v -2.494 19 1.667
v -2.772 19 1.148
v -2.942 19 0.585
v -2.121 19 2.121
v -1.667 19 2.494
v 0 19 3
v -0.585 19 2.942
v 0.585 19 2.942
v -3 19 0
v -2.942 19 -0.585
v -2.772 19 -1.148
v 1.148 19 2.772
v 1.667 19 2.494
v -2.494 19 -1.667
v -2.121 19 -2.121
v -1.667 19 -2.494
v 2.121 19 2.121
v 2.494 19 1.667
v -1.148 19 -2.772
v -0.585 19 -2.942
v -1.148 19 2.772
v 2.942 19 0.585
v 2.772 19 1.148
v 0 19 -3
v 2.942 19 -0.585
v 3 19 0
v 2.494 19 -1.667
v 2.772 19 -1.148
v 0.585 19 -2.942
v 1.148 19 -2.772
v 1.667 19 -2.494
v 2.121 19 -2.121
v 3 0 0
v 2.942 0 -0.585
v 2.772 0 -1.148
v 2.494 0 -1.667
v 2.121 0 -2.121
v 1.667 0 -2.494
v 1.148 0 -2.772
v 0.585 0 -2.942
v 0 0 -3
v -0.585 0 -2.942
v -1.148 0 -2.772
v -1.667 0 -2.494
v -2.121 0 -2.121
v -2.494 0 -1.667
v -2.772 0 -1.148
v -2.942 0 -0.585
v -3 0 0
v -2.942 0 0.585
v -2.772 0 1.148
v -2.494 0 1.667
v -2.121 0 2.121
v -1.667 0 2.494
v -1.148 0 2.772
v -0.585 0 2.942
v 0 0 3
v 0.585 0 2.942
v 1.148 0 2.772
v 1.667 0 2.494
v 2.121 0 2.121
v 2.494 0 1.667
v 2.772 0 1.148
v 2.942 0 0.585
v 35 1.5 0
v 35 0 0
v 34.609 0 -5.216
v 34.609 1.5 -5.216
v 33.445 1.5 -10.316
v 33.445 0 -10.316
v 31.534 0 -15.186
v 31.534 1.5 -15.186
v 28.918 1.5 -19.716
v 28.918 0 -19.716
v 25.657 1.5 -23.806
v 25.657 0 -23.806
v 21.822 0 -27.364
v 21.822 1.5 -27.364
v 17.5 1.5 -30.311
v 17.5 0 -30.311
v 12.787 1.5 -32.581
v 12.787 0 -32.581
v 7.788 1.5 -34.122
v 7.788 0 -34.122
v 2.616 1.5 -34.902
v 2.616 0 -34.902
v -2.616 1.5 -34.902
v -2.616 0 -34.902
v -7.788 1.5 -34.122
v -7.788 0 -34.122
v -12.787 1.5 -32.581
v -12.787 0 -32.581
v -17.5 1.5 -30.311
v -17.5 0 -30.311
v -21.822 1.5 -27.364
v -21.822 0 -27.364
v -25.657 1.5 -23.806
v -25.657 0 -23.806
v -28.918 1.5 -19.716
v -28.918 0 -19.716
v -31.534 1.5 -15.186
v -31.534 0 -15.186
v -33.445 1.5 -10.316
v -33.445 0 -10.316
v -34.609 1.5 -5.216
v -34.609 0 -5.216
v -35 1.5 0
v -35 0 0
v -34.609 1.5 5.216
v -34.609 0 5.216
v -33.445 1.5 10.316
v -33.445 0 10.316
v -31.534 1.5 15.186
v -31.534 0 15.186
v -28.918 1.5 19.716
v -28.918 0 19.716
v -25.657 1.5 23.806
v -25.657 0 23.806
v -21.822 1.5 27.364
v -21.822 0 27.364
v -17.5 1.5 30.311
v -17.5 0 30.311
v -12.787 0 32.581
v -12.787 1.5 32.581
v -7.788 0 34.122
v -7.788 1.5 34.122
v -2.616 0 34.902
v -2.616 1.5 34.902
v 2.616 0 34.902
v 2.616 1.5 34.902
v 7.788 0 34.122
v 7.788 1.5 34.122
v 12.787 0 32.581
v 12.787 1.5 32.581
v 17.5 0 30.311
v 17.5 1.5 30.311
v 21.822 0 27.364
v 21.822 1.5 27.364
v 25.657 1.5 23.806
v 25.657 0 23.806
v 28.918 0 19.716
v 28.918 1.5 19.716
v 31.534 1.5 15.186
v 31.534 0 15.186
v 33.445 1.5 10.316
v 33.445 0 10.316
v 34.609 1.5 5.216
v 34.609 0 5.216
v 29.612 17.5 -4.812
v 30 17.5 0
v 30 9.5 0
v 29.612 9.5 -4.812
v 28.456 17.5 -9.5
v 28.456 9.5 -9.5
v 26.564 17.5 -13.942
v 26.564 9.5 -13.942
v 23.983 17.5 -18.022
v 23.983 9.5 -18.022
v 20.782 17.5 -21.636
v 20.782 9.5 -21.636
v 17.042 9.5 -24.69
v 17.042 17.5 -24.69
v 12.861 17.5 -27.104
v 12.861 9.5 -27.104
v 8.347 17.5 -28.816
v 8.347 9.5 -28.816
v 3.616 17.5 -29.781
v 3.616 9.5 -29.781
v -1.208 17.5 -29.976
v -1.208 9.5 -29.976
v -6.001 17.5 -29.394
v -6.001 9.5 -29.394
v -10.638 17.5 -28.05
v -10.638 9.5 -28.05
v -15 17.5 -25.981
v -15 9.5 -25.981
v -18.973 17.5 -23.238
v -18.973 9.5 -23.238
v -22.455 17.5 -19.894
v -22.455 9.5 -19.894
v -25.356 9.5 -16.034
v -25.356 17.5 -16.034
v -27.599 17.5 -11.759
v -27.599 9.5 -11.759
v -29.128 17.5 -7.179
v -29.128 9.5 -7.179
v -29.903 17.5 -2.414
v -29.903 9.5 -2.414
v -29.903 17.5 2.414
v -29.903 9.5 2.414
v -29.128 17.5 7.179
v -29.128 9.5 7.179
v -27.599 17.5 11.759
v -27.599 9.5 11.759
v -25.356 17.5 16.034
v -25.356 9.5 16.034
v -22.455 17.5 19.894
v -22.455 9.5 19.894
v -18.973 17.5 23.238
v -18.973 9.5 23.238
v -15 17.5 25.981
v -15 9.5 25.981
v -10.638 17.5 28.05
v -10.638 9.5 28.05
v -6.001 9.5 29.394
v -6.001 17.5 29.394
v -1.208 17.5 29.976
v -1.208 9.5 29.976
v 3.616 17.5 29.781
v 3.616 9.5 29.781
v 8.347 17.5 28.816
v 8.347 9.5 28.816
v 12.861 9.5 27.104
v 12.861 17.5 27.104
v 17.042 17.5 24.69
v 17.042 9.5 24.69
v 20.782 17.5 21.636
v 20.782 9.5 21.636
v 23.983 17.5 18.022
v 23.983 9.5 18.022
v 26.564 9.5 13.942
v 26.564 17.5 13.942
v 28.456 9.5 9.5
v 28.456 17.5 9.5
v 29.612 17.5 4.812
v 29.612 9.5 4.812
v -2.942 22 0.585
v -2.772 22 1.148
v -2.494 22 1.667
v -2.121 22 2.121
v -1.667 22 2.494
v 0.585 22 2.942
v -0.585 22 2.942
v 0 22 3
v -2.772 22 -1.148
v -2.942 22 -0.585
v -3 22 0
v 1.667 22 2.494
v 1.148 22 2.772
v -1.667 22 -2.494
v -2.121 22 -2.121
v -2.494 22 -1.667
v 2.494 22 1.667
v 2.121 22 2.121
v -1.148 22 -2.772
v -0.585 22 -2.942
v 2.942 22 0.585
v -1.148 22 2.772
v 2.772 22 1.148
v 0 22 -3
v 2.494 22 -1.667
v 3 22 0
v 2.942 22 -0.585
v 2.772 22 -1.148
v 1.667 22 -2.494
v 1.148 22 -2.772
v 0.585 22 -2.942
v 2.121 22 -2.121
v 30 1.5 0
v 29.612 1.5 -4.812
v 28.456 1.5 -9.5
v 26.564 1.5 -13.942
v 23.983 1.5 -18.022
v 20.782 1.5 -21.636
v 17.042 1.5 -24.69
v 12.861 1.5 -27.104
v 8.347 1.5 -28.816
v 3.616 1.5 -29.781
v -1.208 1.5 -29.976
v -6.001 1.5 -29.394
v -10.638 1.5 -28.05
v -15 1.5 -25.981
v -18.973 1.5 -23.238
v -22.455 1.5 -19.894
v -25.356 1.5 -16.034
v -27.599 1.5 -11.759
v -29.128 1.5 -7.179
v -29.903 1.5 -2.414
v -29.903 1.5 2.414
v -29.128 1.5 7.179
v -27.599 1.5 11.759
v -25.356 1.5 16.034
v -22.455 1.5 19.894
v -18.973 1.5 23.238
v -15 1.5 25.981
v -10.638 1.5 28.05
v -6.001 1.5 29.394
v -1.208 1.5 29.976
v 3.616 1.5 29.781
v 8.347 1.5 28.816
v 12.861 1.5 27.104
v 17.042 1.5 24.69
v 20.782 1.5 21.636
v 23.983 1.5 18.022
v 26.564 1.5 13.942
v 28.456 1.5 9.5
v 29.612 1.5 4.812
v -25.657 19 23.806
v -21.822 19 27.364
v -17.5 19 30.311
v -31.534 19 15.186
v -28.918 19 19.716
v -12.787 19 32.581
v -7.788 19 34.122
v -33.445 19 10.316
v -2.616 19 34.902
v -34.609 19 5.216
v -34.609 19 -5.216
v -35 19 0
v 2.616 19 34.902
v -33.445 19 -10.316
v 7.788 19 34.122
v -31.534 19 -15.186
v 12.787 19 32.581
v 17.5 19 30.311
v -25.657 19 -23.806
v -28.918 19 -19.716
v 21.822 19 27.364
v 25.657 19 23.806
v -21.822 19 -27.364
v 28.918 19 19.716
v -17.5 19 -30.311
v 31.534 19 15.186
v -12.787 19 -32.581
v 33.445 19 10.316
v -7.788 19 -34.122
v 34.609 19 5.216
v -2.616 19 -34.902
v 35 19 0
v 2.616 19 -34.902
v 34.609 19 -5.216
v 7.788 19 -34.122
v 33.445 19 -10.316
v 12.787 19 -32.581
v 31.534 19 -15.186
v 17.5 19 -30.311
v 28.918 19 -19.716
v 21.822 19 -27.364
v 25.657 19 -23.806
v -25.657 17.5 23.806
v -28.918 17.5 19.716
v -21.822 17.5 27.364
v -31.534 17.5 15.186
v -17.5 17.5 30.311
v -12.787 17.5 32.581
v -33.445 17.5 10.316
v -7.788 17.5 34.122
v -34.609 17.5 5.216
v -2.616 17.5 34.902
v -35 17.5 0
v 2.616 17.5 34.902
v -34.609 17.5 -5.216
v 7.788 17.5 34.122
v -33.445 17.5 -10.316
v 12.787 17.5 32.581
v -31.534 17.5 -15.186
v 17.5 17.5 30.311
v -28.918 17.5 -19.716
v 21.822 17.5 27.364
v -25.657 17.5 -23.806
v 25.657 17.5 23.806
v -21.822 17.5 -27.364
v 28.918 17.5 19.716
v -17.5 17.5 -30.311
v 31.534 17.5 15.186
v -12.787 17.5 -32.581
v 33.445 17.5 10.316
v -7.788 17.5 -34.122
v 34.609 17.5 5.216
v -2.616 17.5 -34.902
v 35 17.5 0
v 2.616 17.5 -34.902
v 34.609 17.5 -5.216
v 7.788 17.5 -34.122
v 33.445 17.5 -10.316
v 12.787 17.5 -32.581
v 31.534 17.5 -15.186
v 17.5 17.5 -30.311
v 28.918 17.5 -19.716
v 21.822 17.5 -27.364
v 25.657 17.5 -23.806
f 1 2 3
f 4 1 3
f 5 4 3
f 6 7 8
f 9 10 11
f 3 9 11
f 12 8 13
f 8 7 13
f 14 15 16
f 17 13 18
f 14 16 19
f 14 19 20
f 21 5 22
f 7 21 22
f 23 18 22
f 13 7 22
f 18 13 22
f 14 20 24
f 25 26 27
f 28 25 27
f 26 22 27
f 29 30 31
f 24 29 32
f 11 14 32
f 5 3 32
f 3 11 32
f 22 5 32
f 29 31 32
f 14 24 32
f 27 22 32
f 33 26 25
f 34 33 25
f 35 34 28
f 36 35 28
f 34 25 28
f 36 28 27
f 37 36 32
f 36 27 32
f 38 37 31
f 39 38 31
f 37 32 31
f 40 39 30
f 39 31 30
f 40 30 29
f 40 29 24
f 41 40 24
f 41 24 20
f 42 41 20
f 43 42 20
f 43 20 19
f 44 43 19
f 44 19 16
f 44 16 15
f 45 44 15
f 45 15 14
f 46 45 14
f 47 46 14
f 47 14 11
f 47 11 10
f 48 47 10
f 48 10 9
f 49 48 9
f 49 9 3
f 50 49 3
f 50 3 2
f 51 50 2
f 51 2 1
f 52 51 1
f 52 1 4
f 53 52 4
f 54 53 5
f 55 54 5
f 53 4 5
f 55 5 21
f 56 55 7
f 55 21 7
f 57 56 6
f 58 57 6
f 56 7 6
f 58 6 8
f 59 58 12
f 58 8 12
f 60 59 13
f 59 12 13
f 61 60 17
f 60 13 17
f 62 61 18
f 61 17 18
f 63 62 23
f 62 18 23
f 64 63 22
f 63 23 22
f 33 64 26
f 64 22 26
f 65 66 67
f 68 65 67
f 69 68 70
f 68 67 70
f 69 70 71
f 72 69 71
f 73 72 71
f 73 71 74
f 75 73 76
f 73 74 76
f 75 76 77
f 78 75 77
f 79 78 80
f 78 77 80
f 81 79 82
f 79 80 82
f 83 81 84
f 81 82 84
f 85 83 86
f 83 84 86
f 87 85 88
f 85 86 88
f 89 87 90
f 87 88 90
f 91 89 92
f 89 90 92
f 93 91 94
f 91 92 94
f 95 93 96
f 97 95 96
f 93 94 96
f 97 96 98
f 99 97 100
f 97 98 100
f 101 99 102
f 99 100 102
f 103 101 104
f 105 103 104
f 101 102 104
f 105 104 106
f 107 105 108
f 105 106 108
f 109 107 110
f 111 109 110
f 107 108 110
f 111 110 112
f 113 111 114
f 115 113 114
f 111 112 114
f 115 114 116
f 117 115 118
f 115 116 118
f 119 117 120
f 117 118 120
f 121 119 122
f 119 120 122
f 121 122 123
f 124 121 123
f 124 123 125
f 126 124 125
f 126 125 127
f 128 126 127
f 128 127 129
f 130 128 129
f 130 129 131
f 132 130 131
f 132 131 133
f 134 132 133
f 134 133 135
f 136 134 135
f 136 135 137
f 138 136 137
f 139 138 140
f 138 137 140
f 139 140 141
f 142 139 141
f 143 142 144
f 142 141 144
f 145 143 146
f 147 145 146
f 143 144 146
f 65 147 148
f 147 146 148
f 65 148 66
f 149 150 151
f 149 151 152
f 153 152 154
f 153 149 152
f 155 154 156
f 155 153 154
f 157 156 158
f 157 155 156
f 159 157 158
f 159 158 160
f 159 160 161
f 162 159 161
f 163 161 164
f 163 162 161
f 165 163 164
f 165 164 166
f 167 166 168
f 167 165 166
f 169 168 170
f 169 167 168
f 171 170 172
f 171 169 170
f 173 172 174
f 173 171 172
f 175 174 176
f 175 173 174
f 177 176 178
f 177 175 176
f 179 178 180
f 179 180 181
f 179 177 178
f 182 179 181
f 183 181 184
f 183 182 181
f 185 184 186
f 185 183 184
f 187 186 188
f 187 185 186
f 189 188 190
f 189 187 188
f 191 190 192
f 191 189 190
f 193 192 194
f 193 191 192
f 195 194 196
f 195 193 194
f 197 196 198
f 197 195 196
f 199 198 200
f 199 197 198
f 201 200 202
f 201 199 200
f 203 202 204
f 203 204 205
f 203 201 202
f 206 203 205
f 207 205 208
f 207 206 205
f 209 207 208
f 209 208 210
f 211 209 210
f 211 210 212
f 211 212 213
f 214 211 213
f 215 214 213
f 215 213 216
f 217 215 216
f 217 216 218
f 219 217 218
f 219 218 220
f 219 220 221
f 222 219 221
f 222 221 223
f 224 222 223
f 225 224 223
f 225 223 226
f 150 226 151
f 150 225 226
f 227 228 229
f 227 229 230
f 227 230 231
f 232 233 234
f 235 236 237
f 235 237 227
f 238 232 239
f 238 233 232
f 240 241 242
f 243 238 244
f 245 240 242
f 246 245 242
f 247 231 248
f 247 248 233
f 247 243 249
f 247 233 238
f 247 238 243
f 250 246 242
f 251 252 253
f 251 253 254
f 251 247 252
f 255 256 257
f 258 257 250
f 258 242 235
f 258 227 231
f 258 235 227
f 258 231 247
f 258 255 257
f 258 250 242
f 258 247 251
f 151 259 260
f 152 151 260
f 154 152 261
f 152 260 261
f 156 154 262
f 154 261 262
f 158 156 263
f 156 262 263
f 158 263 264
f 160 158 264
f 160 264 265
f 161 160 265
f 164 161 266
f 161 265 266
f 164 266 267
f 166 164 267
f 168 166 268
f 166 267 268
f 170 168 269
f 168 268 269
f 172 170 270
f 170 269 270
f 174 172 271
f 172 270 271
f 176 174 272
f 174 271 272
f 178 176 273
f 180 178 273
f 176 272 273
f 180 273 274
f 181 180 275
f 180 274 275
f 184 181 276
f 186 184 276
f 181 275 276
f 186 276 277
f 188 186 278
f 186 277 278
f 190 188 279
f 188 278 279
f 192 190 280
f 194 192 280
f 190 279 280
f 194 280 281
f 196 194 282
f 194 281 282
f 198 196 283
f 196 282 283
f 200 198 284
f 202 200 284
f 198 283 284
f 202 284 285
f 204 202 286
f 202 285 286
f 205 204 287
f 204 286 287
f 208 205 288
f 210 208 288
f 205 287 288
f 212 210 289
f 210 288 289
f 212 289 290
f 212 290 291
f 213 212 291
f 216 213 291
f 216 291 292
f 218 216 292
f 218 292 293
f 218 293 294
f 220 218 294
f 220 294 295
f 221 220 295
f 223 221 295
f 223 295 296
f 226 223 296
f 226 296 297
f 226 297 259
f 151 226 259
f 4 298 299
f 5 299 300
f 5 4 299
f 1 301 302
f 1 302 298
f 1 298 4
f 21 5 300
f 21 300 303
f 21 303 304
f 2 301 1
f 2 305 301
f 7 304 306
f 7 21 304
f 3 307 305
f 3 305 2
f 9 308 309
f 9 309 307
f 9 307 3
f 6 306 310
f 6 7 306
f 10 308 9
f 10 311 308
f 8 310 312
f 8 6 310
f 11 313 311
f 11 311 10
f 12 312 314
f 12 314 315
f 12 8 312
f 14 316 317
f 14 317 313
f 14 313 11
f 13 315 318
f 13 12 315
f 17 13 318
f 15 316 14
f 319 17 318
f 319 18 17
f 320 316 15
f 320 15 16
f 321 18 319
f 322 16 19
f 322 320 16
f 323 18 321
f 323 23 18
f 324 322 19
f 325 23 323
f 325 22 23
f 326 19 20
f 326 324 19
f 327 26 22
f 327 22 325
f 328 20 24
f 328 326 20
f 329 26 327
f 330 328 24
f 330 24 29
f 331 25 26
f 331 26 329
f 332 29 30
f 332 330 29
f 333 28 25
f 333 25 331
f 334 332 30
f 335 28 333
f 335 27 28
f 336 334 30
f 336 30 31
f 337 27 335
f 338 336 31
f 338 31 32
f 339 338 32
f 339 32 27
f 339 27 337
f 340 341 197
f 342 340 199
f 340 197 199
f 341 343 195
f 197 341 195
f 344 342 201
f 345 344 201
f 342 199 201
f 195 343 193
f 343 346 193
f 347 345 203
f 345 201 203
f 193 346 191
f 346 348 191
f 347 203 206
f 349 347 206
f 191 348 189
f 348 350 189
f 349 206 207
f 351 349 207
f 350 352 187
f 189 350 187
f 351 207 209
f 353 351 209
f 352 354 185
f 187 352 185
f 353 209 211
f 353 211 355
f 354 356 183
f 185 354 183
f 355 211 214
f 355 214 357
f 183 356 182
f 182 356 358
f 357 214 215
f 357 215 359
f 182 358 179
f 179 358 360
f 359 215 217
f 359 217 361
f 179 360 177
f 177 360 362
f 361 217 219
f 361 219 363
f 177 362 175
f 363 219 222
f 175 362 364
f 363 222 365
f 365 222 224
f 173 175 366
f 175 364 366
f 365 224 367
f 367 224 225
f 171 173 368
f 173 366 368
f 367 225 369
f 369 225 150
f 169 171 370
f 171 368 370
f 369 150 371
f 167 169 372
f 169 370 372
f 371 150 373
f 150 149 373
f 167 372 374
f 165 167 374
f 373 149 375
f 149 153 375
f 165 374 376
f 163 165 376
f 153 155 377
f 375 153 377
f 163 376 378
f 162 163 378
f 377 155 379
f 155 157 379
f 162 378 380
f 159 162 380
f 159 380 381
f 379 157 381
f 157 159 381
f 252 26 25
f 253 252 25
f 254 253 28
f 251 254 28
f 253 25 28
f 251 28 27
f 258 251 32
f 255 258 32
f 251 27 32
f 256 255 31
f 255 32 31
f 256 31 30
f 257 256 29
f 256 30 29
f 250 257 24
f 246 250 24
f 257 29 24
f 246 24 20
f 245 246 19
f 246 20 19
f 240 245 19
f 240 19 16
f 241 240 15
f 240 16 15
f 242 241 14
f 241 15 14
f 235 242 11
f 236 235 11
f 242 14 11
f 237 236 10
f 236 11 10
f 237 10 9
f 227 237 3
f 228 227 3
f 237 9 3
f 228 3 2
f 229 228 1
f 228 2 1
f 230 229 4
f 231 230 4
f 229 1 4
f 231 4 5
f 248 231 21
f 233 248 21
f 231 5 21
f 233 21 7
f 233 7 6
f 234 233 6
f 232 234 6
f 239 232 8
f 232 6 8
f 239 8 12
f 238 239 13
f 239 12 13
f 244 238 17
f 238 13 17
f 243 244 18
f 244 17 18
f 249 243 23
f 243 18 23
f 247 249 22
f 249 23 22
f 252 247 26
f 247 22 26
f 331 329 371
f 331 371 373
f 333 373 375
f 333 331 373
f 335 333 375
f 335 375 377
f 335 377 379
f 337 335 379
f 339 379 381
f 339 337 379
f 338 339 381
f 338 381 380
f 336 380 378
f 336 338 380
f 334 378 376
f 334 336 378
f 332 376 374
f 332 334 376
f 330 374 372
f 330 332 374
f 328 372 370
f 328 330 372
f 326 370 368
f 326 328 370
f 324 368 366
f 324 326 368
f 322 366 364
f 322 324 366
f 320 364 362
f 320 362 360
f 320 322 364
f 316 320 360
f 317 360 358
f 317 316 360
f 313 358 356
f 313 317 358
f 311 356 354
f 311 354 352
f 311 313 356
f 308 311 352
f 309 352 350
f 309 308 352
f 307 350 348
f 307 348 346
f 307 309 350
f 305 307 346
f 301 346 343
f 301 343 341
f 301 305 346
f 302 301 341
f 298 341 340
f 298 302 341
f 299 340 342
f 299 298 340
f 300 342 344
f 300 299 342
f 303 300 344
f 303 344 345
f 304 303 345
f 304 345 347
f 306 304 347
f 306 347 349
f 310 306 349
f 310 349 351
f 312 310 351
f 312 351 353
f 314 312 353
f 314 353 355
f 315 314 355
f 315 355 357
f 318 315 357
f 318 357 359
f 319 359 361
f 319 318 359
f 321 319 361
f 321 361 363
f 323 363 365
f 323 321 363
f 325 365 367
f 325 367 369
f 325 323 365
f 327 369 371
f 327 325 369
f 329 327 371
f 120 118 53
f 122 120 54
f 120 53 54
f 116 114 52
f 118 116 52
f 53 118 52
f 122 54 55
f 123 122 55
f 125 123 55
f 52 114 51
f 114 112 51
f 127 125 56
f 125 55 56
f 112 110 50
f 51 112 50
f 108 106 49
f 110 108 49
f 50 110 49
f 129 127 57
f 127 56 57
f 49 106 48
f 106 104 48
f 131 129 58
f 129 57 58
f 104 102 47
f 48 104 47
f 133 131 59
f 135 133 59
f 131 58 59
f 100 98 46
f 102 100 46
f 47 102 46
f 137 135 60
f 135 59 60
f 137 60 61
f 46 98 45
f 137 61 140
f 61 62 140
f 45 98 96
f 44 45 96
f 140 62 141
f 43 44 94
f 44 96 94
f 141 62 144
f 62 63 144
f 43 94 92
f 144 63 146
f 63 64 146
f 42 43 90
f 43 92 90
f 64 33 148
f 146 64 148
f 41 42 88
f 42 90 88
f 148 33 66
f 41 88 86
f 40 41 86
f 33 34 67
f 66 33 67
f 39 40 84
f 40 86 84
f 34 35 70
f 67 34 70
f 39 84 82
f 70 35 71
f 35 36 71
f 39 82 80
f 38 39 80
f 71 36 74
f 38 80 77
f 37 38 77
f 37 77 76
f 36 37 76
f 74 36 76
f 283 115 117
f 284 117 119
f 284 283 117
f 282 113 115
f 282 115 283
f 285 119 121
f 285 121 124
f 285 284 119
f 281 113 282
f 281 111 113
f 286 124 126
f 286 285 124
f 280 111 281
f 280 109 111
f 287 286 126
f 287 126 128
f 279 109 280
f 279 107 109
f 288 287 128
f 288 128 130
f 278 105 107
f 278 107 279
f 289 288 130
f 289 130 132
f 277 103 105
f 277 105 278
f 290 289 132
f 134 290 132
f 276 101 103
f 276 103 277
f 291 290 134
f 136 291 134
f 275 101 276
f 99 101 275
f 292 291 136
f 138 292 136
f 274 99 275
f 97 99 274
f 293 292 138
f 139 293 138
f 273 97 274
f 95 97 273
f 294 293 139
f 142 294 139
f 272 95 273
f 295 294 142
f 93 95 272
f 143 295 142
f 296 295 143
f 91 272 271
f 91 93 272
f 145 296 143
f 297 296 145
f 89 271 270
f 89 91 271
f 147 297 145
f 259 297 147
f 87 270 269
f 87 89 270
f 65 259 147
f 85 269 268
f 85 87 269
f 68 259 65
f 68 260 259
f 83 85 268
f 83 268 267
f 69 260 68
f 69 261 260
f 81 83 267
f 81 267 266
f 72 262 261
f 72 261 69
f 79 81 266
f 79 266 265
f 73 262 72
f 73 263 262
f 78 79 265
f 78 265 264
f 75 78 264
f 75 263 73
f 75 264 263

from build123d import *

# Parameters (mm, degrees)
SKETCH1_R           = 35
BOSS_EXTRUDE1_DEPTH = 1.5
SKETCH2_R           = 30
BOSS_EXTRUDE3_DEPTH = 8
SKETCH3_R           = 3
CUT_EXTRUDE1_DEPTH  = 80
SKETCH6_R           = 3
BOSS_EXTRUDE5_DEPTH = 3


with BuildPart() as part:
    # Sketch1 → Boss-Extrude1 (new body)
    with BuildSketch(Plane(origin=(0, 0, 0), x_dir=(1, 0, 0), z_dir=(0, 1, 0))):
        Circle(SKETCH1_R)
    extrude(amount=BOSS_EXTRUDE1_DEPTH)

    # Sketch2 → Boss-Extrude3 (add)
    with BuildSketch(Plane(origin=(0, 1.5, 0), x_dir=(1, 0, 0), z_dir=(0, 1, 0))):
        Circle(SKETCH2_R)
    extrude(amount=BOSS_EXTRUDE3_DEPTH)

    # Mirror1: part across plane


with BuildPart() as part_1:
    add(part.part)
    add(part.part.mirror(Plane.ZX.offset(9.5)))

    # Sketch3 → Cut-Extrude1 (cut)
    with BuildSketch(Plane(origin=(0, 19, 0), x_dir=(1, 0, 0), z_dir=(0, 1, 0))):
        Circle(SKETCH3_R)
    extrude(amount=-CUT_EXTRUDE1_DEPTH, mode=Mode.SUBTRACT)


with BuildPart() as body_2:
    # Sketch6 → Boss-Extrude5 (new body)
    with BuildSketch(Plane(origin=(0, 19, 0), x_dir=(1, 0, 0), z_dir=(0, 1, 0))):
        Circle(SKETCH6_R)
    extrude(amount=BOSS_EXTRUDE5_DEPTH)


solid = Compound([part_1.part, body_2.part])
